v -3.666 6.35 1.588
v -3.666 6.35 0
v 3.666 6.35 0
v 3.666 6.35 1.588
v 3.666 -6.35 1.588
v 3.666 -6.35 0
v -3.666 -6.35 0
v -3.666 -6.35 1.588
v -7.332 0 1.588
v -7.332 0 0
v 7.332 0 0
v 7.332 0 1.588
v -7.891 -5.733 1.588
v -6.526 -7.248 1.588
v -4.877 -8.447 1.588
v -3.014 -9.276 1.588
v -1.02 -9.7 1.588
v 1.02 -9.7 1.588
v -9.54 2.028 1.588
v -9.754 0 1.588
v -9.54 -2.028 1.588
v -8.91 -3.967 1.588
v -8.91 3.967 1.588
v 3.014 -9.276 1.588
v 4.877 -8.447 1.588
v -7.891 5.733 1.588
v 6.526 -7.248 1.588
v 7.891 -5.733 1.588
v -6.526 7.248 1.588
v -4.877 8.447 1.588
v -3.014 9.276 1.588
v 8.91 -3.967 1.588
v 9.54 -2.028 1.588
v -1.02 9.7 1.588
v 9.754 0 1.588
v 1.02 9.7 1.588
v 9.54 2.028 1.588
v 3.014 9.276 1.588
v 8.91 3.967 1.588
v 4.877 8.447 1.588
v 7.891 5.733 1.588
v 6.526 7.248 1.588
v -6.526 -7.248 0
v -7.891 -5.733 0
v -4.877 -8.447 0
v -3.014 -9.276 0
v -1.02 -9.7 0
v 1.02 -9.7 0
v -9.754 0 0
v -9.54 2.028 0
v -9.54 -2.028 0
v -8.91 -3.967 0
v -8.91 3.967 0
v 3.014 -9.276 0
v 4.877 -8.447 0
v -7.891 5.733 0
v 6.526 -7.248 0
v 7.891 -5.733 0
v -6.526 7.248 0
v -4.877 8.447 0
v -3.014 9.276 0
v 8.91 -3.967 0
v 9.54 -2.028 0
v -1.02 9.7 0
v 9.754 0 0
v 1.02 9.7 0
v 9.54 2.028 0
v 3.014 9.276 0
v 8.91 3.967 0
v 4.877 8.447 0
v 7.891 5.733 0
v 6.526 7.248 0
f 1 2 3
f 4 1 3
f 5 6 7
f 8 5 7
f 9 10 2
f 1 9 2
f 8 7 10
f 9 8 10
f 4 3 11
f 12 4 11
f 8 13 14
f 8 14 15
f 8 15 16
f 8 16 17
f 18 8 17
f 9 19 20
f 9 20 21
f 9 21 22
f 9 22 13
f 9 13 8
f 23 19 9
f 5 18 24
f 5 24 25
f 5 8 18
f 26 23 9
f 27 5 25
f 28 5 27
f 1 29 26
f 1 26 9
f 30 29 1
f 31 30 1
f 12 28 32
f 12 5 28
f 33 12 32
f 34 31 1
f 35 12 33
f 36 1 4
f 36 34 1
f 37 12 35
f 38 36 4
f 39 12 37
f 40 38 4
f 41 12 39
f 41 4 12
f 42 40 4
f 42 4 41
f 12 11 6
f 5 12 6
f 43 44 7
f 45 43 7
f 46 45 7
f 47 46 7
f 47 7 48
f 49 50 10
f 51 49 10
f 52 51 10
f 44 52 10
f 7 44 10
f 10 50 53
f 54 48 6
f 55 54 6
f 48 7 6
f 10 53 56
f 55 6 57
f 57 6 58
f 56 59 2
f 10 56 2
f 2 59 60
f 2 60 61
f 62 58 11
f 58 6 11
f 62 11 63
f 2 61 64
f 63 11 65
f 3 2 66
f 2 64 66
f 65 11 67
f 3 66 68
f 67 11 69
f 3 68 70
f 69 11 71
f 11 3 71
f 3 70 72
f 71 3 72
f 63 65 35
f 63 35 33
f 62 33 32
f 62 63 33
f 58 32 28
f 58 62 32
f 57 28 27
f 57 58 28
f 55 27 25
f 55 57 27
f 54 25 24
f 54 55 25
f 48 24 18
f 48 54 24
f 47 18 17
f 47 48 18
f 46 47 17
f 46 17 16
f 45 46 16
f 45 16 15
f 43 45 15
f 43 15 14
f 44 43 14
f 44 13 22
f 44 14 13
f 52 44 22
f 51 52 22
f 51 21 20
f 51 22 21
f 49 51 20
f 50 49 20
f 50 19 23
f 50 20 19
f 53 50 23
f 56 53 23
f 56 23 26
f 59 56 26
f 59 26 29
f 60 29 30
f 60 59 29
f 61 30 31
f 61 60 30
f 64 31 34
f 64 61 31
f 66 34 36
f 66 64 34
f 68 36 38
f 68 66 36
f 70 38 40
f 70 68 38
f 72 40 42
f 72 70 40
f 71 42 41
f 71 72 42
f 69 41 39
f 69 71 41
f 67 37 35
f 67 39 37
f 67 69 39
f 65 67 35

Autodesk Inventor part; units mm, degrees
ref_plane "YZ Plane" through (0, 0, 0) normal (1, 0, 0) x (0, 1, 0)
ref_plane "XZ Plane" through (0, 0, 0) normal (0, 1, 0) x (-1, 0, 0)
ref_plane "XY Plane" through (0, 0, 0) normal (0, 0, 1) x (1, 0, 0)
sketch "Sketch1" plane through (0, 0, 0) normal (0, 0, 1) x (1, 0, 0)
  circle A0 centre (0, 0) radius 9.7536
  line L0 (-7.3323, 0) -> (-3.6662, 6.35)
  line L1 (-3.6662, 6.35) -> (3.6662, 6.35)
  line L2 (3.6662, 6.35) -> (7.3323, 0)
  line L3 (7.3323, 0) -> (3.6662, -6.35)
  line L4 (3.6662, -6.35) -> (-3.6662, -6.35)
  line L5 (-3.6662, -6.35) -> (-7.3323, 0)
  dimension "d0" = 19.5072
  dimension "d1" = 12.7
extrude "Extrusion1" add sketch "Sketch1" along normal blind 1.5875
properties part number "acetalspacer" material "PVC-Piping"
